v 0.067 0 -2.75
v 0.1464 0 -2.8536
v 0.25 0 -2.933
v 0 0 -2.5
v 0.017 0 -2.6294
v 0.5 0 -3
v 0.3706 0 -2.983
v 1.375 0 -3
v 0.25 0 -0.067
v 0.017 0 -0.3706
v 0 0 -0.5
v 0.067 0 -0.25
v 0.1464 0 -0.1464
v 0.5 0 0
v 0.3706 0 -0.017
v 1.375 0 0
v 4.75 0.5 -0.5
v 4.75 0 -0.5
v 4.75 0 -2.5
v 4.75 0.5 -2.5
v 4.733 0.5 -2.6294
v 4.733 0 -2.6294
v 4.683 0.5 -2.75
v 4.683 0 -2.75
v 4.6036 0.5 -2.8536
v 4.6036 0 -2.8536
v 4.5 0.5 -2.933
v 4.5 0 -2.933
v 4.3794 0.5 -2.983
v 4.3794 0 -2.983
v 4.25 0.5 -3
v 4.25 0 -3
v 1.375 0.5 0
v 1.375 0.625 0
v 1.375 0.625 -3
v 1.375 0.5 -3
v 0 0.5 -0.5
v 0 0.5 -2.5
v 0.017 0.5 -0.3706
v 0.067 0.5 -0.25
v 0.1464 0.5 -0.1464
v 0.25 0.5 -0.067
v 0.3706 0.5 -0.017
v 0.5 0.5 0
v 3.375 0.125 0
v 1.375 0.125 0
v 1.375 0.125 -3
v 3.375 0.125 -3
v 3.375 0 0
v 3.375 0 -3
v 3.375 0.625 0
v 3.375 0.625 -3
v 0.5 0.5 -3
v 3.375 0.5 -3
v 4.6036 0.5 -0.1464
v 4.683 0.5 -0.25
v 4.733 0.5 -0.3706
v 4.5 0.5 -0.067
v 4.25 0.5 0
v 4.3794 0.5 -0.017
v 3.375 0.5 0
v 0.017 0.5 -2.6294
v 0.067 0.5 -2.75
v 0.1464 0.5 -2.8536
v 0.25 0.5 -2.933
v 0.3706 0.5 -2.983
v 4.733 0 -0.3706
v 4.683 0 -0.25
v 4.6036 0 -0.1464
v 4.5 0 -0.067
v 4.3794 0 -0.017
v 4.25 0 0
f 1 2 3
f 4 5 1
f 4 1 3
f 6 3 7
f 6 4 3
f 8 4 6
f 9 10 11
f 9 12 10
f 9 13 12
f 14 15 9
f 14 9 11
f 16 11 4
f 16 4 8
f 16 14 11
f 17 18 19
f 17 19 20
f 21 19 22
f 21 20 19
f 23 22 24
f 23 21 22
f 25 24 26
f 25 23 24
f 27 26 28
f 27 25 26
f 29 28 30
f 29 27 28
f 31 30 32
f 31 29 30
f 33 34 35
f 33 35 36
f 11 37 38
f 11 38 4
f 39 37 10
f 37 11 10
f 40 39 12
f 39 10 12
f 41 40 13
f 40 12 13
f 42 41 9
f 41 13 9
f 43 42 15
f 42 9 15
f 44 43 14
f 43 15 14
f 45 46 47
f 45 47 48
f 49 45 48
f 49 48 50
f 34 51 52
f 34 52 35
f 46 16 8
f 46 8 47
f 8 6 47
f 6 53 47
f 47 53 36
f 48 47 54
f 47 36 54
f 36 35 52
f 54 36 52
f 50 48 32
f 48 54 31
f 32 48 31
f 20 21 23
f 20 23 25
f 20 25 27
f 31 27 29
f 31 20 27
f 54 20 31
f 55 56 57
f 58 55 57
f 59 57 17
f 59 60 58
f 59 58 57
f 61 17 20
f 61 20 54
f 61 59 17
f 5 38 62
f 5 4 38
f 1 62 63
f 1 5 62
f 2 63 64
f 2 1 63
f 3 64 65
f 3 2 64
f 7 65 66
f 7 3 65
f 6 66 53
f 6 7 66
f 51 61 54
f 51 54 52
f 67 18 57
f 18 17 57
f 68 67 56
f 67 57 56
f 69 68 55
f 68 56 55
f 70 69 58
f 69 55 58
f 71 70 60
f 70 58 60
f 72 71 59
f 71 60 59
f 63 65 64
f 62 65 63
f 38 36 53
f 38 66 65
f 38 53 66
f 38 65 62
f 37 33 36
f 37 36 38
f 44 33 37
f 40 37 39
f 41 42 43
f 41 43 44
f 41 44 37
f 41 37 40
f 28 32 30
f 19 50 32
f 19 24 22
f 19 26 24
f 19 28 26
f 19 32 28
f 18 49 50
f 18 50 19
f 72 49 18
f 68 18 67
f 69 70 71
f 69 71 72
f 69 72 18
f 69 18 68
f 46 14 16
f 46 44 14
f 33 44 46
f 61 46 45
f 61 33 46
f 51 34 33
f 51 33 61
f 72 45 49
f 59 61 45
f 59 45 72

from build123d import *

# Parameters (mm, degrees)
BOSS_EXTRUDE1_DEPTH = 3
FILLET1_R           = 0.5


with BuildPart() as part:
    # Sketch1 → Boss-Extrude1 (new body)
    with BuildSketch(Plane.XY):
        Polygon((0, 0), (1.375, 0), (1.375, 0.125), (3.375, 0.125), (3.375, 0), (4.75, 0), (4.75, 0.5), (3.375, 0.5), (3.375, 0.625), (1.375, 0.625), (1.375, 0.5), (0, 0.5), align=None)
    extrude(amount=-BOSS_EXTRUDE1_DEPTH)

    # Fillet1
    fillet1_edges = [part.edges().sort_by_distance(p)[0] for p in [
        (4.75, 0.25, 0),
        (0, 0.25, 0),
        (4.75, 0.25, -3),
        (0, 0.25, -3),
    ]]
    fillet(fillet1_edges, radius=FILLET1_R)


solid = part.part
